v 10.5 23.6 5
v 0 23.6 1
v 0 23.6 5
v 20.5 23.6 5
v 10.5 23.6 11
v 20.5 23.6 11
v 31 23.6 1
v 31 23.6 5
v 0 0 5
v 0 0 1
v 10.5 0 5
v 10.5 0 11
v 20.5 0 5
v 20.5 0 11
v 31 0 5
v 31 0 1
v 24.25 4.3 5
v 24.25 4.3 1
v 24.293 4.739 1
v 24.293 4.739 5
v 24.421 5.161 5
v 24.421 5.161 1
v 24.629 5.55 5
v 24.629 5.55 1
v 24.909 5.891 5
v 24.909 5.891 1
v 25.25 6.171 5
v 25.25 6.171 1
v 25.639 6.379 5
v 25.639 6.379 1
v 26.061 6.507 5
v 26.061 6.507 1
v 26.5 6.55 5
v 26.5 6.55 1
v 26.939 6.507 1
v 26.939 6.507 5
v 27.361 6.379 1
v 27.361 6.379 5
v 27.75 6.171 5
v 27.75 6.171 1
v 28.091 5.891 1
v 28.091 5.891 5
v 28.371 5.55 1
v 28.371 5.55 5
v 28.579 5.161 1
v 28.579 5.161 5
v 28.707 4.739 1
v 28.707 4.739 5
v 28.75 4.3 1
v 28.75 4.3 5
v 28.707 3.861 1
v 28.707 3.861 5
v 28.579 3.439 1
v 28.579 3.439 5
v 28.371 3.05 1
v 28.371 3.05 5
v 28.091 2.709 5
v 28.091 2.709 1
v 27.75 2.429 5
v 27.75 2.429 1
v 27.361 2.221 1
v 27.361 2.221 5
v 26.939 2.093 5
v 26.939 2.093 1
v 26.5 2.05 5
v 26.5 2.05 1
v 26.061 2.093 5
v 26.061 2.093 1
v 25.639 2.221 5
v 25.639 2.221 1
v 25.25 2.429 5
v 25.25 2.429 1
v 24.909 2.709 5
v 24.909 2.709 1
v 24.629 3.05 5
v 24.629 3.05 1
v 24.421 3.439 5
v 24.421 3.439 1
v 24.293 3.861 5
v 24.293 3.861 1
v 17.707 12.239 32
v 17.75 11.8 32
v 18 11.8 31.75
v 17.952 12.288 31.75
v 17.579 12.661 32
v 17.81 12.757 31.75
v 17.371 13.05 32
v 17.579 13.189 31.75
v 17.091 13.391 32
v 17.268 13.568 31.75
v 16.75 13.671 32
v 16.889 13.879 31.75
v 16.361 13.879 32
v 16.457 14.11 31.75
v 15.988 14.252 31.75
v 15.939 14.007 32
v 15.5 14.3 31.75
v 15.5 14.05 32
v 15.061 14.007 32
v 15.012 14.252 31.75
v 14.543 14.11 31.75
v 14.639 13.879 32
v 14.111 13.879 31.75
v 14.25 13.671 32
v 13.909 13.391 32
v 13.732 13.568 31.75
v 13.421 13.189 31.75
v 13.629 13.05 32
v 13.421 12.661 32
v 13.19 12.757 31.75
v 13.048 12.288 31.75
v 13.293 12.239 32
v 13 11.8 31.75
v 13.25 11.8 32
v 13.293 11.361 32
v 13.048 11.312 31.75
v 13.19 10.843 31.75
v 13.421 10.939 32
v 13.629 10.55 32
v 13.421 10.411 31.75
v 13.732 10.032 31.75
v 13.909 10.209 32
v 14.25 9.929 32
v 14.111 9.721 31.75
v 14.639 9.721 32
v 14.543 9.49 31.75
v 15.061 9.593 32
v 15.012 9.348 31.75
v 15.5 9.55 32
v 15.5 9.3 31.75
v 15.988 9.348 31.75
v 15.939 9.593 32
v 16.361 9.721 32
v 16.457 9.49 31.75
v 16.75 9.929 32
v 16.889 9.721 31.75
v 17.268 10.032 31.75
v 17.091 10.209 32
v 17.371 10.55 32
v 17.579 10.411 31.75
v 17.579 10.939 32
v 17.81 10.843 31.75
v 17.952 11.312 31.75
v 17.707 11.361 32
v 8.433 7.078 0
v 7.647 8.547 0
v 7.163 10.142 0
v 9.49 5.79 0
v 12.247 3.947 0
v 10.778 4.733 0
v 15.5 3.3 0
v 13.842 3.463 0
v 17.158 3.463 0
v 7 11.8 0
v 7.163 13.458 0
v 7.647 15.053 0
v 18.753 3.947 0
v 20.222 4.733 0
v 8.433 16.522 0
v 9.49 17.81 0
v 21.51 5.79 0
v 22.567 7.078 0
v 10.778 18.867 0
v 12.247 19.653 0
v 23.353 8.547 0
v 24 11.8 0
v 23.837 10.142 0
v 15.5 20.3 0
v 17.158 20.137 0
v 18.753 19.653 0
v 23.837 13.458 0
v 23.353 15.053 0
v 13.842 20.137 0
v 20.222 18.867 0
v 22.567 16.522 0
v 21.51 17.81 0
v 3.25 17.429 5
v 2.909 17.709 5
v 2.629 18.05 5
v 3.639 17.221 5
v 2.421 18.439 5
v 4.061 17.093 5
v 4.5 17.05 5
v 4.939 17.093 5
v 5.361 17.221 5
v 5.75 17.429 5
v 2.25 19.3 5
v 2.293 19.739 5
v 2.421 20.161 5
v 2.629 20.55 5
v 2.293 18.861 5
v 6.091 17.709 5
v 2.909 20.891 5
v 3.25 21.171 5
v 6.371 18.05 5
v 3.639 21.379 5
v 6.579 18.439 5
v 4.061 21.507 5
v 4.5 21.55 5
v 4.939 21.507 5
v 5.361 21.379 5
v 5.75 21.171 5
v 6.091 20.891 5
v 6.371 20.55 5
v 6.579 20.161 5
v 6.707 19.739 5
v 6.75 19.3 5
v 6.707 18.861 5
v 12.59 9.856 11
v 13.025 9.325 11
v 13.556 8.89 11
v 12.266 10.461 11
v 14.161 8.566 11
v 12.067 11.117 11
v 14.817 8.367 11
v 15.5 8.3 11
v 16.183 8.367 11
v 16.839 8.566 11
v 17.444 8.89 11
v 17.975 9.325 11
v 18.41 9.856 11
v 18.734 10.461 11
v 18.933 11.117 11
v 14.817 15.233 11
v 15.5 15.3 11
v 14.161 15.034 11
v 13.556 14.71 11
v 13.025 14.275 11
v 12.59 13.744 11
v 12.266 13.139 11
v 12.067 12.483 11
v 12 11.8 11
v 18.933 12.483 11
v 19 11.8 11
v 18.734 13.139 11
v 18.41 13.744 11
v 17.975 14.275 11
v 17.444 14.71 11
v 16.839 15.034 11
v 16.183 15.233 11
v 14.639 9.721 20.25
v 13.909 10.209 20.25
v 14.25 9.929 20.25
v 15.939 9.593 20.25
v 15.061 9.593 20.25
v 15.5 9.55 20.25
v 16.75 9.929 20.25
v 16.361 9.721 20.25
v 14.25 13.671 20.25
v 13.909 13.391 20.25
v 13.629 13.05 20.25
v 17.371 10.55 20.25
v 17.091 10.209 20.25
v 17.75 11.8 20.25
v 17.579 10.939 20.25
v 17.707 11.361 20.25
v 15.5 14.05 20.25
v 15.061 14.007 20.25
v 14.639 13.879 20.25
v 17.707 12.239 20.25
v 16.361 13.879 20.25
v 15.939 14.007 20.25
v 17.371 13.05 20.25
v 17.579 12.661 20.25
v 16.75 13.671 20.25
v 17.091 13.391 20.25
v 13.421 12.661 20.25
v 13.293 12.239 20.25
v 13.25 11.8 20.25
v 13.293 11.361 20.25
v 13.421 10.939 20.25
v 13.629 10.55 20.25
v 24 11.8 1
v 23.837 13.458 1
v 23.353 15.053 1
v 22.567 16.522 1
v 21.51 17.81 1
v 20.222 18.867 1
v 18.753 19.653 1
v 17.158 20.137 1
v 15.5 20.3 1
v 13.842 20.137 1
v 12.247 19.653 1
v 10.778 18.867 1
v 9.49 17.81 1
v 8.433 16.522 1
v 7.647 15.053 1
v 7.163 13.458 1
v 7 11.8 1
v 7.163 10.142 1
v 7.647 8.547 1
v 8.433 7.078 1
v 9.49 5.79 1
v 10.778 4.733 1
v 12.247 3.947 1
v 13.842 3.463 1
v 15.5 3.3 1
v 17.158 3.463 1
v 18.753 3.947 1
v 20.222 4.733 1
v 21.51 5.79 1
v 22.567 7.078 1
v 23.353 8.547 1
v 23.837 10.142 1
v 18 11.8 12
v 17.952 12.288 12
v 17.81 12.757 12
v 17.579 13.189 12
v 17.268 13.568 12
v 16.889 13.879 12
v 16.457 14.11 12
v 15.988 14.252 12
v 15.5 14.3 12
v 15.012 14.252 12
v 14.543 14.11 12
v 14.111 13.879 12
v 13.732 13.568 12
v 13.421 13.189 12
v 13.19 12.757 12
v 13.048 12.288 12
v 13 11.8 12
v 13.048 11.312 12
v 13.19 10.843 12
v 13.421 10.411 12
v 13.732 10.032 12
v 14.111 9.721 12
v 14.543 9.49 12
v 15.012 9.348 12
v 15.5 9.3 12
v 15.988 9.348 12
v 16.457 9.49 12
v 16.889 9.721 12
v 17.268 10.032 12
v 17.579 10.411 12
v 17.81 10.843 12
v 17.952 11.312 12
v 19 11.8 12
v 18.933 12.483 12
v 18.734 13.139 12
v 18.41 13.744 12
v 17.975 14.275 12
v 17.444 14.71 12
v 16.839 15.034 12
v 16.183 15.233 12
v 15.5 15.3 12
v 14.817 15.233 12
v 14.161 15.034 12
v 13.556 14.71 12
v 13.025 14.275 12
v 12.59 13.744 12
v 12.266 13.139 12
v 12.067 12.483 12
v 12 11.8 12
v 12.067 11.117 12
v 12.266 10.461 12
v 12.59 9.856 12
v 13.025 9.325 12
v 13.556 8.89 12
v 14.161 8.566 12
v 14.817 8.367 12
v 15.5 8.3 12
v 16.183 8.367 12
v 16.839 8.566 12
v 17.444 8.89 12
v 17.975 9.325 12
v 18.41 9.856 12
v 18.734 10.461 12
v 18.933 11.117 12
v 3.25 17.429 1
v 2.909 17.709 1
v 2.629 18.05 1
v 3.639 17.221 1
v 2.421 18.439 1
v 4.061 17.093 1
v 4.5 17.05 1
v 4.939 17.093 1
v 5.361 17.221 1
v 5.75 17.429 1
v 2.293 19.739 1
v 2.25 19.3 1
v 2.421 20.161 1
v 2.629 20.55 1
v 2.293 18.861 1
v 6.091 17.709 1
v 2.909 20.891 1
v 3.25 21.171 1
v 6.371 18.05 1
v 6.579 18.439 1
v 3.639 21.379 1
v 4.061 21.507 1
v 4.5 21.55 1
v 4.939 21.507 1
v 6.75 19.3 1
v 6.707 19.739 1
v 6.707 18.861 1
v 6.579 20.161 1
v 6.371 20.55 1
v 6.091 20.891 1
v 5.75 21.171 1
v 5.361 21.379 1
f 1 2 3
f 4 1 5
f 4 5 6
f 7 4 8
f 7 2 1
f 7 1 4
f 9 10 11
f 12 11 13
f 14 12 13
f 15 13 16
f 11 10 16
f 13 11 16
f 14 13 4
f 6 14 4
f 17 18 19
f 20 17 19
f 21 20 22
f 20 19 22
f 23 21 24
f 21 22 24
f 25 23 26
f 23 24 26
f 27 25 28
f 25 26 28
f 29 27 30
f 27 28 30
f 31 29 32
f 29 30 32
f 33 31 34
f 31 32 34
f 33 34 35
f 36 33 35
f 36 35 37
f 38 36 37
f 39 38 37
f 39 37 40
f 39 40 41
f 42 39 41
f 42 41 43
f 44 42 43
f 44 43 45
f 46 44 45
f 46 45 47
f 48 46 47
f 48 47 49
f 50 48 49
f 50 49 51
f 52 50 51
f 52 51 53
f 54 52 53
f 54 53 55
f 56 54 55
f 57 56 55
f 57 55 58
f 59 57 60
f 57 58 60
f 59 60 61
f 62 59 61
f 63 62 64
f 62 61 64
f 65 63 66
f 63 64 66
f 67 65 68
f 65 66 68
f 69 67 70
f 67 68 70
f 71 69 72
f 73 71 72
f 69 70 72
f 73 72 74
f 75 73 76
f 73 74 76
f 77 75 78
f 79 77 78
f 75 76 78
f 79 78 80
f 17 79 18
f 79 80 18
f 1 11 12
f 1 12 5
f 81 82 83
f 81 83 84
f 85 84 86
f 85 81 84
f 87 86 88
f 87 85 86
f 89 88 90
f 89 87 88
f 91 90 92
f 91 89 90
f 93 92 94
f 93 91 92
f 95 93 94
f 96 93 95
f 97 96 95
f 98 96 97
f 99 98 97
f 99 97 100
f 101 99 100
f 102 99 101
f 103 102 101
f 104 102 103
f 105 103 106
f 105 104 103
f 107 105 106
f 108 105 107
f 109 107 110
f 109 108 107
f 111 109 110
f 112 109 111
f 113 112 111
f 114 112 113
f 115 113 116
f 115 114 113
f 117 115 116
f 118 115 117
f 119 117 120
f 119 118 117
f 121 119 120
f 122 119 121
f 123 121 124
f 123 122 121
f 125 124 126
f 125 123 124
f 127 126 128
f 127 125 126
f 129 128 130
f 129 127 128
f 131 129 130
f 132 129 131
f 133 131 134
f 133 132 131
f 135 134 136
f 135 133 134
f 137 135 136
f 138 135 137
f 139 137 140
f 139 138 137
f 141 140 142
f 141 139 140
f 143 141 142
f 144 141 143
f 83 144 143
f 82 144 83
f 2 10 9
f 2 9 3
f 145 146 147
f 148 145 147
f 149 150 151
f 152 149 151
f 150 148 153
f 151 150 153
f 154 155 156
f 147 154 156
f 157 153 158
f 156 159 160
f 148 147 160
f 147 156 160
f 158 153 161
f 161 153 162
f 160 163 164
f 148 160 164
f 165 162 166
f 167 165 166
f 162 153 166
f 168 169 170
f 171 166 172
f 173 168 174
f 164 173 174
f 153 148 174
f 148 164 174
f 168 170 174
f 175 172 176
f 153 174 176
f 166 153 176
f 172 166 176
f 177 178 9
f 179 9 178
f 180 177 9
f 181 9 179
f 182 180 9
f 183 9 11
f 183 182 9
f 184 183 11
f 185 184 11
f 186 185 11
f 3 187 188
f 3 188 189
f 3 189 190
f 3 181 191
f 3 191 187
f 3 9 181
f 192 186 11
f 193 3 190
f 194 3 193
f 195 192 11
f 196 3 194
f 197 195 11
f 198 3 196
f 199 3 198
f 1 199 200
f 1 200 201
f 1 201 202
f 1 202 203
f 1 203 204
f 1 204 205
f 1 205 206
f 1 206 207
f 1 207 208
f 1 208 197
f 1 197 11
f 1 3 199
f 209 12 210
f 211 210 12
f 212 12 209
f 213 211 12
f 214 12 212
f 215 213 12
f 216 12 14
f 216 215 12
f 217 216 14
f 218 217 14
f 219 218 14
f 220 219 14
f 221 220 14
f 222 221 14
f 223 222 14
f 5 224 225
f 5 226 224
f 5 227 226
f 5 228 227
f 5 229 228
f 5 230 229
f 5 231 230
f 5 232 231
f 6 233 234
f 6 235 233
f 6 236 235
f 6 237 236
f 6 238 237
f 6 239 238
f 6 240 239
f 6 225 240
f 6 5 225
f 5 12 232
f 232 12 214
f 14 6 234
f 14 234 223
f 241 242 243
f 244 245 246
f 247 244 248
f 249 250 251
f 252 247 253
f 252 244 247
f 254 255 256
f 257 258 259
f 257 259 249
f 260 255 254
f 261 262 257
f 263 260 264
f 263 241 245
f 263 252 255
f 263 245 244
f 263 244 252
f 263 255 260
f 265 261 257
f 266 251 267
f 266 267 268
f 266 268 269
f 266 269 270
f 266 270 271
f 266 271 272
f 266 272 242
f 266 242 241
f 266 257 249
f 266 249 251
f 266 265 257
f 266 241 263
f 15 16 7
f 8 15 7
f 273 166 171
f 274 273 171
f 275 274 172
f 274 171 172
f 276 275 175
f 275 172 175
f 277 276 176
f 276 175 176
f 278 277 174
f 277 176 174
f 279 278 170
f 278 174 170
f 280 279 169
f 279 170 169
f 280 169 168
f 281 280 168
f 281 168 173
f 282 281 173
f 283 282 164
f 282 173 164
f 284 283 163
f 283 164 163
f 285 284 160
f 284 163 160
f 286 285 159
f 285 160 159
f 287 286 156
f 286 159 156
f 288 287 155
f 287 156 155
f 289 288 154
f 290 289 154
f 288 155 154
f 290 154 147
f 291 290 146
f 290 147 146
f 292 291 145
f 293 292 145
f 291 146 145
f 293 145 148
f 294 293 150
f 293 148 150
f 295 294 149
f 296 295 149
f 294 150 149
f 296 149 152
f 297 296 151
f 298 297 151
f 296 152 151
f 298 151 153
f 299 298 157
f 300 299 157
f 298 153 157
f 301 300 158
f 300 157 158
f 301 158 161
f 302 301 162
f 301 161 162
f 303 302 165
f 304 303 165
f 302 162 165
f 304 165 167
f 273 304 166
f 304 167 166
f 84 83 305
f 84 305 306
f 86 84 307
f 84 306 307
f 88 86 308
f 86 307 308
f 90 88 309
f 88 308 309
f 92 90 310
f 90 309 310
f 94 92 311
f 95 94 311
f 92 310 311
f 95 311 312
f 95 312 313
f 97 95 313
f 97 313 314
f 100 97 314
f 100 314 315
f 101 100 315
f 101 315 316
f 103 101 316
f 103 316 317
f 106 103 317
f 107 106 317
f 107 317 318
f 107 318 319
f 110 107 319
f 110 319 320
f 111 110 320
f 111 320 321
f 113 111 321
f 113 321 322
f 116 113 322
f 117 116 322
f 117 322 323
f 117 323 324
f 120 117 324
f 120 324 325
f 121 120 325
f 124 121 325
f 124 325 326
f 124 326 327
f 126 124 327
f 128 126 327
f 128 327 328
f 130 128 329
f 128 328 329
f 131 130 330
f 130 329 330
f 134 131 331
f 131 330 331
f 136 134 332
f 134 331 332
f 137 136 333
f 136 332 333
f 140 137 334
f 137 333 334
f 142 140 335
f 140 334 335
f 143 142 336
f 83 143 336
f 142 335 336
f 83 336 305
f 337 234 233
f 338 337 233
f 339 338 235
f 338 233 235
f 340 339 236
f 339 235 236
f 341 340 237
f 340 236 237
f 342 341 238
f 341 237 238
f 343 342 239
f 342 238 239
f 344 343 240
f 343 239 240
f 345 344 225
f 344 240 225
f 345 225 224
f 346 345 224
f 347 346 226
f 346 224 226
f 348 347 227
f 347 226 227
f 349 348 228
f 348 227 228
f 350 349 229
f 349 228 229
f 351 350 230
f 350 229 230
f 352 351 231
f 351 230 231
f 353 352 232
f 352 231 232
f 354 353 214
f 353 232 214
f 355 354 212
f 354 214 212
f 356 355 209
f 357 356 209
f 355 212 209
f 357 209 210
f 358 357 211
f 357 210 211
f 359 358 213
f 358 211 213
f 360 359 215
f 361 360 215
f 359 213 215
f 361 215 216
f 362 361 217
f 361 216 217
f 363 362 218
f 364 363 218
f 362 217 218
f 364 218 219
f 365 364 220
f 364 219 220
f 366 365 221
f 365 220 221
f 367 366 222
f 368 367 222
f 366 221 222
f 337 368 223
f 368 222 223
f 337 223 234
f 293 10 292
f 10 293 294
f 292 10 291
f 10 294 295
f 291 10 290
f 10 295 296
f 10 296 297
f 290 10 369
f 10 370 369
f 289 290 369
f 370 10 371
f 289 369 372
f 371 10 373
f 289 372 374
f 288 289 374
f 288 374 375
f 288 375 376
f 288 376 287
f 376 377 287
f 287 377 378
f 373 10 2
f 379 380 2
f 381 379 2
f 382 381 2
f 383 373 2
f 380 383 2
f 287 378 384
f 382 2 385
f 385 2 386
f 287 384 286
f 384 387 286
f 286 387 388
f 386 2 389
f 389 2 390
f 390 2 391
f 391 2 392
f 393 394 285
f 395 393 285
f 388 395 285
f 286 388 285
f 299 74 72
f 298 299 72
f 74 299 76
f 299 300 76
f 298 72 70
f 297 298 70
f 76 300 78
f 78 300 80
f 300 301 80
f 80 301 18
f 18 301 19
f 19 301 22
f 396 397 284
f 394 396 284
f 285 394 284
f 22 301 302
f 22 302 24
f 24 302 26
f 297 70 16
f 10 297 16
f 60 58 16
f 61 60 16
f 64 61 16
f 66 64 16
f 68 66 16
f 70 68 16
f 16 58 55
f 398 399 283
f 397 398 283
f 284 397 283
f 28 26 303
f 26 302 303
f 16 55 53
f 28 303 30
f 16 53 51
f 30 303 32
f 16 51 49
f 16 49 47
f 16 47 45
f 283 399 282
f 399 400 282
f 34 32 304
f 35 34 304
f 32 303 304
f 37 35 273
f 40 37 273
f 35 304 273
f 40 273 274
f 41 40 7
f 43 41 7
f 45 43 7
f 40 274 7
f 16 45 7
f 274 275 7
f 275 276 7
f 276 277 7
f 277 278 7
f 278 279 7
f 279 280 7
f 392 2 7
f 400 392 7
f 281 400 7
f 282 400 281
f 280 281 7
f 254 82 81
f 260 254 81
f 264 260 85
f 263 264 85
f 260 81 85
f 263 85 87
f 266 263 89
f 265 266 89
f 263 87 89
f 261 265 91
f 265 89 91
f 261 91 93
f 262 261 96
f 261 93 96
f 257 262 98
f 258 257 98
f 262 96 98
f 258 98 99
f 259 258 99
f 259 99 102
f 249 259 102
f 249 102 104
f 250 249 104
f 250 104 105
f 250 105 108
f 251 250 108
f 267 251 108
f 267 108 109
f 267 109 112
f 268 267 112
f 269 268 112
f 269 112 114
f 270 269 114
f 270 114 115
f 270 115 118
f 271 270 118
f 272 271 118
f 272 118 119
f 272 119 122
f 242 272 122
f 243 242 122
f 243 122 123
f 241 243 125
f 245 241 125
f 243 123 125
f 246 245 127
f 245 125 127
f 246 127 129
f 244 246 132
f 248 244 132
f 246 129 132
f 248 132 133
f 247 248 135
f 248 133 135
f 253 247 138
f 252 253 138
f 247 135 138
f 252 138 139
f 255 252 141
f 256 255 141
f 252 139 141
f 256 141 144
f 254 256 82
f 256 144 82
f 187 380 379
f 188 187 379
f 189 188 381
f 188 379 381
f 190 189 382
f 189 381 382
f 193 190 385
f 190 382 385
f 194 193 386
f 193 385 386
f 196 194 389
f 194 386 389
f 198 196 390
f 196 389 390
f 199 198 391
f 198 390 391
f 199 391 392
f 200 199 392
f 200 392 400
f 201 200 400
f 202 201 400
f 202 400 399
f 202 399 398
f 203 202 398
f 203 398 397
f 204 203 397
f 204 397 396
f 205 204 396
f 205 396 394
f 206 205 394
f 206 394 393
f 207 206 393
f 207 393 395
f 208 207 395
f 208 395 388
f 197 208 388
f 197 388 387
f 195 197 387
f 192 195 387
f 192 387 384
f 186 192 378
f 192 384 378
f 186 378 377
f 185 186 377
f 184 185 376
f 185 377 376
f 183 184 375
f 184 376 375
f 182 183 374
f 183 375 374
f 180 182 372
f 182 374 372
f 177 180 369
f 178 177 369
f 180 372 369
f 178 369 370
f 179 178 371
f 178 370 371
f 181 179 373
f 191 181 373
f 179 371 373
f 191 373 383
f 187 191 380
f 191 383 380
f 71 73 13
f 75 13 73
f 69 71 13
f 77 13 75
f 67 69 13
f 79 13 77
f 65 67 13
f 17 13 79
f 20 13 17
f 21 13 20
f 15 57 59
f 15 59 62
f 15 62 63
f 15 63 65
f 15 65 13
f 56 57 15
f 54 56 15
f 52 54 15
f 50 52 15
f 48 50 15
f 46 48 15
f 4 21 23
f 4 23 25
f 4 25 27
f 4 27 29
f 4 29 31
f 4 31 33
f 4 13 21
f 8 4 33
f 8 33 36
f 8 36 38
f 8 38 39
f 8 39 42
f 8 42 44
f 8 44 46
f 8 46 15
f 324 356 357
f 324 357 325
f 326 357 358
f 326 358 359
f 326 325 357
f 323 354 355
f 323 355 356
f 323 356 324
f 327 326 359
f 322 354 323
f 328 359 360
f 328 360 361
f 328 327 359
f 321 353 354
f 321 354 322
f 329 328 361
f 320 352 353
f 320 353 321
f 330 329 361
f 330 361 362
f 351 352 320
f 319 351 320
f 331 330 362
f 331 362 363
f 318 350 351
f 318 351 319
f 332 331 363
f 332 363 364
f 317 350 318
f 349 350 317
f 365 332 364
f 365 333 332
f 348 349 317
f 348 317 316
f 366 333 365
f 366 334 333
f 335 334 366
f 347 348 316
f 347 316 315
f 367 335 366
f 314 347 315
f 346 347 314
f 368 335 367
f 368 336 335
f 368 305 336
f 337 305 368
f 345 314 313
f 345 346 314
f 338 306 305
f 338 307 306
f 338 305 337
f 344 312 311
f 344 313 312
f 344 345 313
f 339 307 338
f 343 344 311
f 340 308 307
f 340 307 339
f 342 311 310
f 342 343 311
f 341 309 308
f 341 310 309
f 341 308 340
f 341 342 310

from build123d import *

# Parameters (mm, degrees)
SKETCH1_R           = 8.5
BOSS_EXTRUDE1_DEPTH = 1
SKETCH2_W           = 31
SKETCH2_H           = 23.6
BOSS_EXTRUDE2_DEPTH = 4
SKETCH3_W           = 10
SKETCH3_H           = 23.6
BOSS_EXTRUDE3_DEPTH = 6
SKETCH4_R           = 3.5
BOSS_EXTRUDE4_DEPTH = 1
SKETCH5_R           = 2.5
BOSS_EXTRUDE5_DEPTH = 20.25
SKETCH7_R           = 2.25
CUT_EXTRUDE1_DEPTH  = 12
SKETCH8_R           = 2.25
CUT_EXTRUDE2_DEPTH  = 50.945194964
CHAMFER1_SIZE       = 0.5


with BuildPart() as part:
    # Sketch1 → Boss-Extrude1 (new body)
    with BuildSketch(Plane.XY):
        with Locations((15.5, 11.8)):
            Circle(SKETCH1_R)
    extrude(amount=BOSS_EXTRUDE1_DEPTH)

    # Sketch2 → Boss-Extrude2 (add)
    with BuildSketch(Plane.XY.offset(1)):
        with Locations((15.5, 11.8)):
            Rectangle(SKETCH2_W, SKETCH2_H)
    extrude(amount=BOSS_EXTRUDE2_DEPTH)

    # Sketch3 → Boss-Extrude3 (add)
    with BuildSketch(Plane.XY.offset(5)):
        with Locations((15.5, 11.8)):
            Rectangle(SKETCH3_W, SKETCH3_H)
    extrude(amount=BOSS_EXTRUDE3_DEPTH)

    # Sketch4 → Boss-Extrude4 (add)
    with BuildSketch(Plane.XY.offset(11)):
        with Locations((15.5, 11.8)):
            Circle(SKETCH4_R)
    extrude(amount=BOSS_EXTRUDE4_DEPTH)

    # Sketch5 → Boss-Extrude5 (add)
    with BuildSketch(Plane.XY.offset(12)):
        with Locations((15.5, 11.8)):
            Circle(SKETCH5_R)
    extrude(amount=BOSS_EXTRUDE5_DEPTH)

    # Sketch7 → Cut-Extrude1 (cut)
    with BuildSketch(Plane.XY.offset(32.25)):
        with Locations((15.5, 11.8)):
            Circle(SKETCH7_R)
    extrude(amount=-CUT_EXTRUDE1_DEPTH, mode=Mode.SUBTRACT)

    # Sketch8 → Cut-Extrude2 (cut, through all)
    with BuildSketch(Plane(origin=(0, 0, 1), x_dir=(-1, 0, 0), z_dir=(0, 0, -1))):
        with Locations((-26.5, 4.3)):
            Circle(SKETCH8_R)
        with Locations((-4.5, 19.3)):
            Circle(SKETCH8_R)
    extrude(amount=-CUT_EXTRUDE2_DEPTH, mode=Mode.SUBTRACT)

    # Chamfer1
    # the kernel refuses this chamfer: 0.5 mm, written as the material it takes off along each edge
    with BuildSketch(Plane(origin=(15.5, 11.8, 32.25), x_dir=(1, 0, 0), z_dir=(0, -1, 0))) as chamfer1_piece_1:
        Polygon((2.5, -CHAMFER1_SIZE), (2.5 - CHAMFER1_SIZE, 0), (2.5, 0), align=None)
    revolve(axis=Axis((15.5, 11.8, 32.25), (0, 0, 1)), mode=Mode.SUBTRACT)


solid = part.part
